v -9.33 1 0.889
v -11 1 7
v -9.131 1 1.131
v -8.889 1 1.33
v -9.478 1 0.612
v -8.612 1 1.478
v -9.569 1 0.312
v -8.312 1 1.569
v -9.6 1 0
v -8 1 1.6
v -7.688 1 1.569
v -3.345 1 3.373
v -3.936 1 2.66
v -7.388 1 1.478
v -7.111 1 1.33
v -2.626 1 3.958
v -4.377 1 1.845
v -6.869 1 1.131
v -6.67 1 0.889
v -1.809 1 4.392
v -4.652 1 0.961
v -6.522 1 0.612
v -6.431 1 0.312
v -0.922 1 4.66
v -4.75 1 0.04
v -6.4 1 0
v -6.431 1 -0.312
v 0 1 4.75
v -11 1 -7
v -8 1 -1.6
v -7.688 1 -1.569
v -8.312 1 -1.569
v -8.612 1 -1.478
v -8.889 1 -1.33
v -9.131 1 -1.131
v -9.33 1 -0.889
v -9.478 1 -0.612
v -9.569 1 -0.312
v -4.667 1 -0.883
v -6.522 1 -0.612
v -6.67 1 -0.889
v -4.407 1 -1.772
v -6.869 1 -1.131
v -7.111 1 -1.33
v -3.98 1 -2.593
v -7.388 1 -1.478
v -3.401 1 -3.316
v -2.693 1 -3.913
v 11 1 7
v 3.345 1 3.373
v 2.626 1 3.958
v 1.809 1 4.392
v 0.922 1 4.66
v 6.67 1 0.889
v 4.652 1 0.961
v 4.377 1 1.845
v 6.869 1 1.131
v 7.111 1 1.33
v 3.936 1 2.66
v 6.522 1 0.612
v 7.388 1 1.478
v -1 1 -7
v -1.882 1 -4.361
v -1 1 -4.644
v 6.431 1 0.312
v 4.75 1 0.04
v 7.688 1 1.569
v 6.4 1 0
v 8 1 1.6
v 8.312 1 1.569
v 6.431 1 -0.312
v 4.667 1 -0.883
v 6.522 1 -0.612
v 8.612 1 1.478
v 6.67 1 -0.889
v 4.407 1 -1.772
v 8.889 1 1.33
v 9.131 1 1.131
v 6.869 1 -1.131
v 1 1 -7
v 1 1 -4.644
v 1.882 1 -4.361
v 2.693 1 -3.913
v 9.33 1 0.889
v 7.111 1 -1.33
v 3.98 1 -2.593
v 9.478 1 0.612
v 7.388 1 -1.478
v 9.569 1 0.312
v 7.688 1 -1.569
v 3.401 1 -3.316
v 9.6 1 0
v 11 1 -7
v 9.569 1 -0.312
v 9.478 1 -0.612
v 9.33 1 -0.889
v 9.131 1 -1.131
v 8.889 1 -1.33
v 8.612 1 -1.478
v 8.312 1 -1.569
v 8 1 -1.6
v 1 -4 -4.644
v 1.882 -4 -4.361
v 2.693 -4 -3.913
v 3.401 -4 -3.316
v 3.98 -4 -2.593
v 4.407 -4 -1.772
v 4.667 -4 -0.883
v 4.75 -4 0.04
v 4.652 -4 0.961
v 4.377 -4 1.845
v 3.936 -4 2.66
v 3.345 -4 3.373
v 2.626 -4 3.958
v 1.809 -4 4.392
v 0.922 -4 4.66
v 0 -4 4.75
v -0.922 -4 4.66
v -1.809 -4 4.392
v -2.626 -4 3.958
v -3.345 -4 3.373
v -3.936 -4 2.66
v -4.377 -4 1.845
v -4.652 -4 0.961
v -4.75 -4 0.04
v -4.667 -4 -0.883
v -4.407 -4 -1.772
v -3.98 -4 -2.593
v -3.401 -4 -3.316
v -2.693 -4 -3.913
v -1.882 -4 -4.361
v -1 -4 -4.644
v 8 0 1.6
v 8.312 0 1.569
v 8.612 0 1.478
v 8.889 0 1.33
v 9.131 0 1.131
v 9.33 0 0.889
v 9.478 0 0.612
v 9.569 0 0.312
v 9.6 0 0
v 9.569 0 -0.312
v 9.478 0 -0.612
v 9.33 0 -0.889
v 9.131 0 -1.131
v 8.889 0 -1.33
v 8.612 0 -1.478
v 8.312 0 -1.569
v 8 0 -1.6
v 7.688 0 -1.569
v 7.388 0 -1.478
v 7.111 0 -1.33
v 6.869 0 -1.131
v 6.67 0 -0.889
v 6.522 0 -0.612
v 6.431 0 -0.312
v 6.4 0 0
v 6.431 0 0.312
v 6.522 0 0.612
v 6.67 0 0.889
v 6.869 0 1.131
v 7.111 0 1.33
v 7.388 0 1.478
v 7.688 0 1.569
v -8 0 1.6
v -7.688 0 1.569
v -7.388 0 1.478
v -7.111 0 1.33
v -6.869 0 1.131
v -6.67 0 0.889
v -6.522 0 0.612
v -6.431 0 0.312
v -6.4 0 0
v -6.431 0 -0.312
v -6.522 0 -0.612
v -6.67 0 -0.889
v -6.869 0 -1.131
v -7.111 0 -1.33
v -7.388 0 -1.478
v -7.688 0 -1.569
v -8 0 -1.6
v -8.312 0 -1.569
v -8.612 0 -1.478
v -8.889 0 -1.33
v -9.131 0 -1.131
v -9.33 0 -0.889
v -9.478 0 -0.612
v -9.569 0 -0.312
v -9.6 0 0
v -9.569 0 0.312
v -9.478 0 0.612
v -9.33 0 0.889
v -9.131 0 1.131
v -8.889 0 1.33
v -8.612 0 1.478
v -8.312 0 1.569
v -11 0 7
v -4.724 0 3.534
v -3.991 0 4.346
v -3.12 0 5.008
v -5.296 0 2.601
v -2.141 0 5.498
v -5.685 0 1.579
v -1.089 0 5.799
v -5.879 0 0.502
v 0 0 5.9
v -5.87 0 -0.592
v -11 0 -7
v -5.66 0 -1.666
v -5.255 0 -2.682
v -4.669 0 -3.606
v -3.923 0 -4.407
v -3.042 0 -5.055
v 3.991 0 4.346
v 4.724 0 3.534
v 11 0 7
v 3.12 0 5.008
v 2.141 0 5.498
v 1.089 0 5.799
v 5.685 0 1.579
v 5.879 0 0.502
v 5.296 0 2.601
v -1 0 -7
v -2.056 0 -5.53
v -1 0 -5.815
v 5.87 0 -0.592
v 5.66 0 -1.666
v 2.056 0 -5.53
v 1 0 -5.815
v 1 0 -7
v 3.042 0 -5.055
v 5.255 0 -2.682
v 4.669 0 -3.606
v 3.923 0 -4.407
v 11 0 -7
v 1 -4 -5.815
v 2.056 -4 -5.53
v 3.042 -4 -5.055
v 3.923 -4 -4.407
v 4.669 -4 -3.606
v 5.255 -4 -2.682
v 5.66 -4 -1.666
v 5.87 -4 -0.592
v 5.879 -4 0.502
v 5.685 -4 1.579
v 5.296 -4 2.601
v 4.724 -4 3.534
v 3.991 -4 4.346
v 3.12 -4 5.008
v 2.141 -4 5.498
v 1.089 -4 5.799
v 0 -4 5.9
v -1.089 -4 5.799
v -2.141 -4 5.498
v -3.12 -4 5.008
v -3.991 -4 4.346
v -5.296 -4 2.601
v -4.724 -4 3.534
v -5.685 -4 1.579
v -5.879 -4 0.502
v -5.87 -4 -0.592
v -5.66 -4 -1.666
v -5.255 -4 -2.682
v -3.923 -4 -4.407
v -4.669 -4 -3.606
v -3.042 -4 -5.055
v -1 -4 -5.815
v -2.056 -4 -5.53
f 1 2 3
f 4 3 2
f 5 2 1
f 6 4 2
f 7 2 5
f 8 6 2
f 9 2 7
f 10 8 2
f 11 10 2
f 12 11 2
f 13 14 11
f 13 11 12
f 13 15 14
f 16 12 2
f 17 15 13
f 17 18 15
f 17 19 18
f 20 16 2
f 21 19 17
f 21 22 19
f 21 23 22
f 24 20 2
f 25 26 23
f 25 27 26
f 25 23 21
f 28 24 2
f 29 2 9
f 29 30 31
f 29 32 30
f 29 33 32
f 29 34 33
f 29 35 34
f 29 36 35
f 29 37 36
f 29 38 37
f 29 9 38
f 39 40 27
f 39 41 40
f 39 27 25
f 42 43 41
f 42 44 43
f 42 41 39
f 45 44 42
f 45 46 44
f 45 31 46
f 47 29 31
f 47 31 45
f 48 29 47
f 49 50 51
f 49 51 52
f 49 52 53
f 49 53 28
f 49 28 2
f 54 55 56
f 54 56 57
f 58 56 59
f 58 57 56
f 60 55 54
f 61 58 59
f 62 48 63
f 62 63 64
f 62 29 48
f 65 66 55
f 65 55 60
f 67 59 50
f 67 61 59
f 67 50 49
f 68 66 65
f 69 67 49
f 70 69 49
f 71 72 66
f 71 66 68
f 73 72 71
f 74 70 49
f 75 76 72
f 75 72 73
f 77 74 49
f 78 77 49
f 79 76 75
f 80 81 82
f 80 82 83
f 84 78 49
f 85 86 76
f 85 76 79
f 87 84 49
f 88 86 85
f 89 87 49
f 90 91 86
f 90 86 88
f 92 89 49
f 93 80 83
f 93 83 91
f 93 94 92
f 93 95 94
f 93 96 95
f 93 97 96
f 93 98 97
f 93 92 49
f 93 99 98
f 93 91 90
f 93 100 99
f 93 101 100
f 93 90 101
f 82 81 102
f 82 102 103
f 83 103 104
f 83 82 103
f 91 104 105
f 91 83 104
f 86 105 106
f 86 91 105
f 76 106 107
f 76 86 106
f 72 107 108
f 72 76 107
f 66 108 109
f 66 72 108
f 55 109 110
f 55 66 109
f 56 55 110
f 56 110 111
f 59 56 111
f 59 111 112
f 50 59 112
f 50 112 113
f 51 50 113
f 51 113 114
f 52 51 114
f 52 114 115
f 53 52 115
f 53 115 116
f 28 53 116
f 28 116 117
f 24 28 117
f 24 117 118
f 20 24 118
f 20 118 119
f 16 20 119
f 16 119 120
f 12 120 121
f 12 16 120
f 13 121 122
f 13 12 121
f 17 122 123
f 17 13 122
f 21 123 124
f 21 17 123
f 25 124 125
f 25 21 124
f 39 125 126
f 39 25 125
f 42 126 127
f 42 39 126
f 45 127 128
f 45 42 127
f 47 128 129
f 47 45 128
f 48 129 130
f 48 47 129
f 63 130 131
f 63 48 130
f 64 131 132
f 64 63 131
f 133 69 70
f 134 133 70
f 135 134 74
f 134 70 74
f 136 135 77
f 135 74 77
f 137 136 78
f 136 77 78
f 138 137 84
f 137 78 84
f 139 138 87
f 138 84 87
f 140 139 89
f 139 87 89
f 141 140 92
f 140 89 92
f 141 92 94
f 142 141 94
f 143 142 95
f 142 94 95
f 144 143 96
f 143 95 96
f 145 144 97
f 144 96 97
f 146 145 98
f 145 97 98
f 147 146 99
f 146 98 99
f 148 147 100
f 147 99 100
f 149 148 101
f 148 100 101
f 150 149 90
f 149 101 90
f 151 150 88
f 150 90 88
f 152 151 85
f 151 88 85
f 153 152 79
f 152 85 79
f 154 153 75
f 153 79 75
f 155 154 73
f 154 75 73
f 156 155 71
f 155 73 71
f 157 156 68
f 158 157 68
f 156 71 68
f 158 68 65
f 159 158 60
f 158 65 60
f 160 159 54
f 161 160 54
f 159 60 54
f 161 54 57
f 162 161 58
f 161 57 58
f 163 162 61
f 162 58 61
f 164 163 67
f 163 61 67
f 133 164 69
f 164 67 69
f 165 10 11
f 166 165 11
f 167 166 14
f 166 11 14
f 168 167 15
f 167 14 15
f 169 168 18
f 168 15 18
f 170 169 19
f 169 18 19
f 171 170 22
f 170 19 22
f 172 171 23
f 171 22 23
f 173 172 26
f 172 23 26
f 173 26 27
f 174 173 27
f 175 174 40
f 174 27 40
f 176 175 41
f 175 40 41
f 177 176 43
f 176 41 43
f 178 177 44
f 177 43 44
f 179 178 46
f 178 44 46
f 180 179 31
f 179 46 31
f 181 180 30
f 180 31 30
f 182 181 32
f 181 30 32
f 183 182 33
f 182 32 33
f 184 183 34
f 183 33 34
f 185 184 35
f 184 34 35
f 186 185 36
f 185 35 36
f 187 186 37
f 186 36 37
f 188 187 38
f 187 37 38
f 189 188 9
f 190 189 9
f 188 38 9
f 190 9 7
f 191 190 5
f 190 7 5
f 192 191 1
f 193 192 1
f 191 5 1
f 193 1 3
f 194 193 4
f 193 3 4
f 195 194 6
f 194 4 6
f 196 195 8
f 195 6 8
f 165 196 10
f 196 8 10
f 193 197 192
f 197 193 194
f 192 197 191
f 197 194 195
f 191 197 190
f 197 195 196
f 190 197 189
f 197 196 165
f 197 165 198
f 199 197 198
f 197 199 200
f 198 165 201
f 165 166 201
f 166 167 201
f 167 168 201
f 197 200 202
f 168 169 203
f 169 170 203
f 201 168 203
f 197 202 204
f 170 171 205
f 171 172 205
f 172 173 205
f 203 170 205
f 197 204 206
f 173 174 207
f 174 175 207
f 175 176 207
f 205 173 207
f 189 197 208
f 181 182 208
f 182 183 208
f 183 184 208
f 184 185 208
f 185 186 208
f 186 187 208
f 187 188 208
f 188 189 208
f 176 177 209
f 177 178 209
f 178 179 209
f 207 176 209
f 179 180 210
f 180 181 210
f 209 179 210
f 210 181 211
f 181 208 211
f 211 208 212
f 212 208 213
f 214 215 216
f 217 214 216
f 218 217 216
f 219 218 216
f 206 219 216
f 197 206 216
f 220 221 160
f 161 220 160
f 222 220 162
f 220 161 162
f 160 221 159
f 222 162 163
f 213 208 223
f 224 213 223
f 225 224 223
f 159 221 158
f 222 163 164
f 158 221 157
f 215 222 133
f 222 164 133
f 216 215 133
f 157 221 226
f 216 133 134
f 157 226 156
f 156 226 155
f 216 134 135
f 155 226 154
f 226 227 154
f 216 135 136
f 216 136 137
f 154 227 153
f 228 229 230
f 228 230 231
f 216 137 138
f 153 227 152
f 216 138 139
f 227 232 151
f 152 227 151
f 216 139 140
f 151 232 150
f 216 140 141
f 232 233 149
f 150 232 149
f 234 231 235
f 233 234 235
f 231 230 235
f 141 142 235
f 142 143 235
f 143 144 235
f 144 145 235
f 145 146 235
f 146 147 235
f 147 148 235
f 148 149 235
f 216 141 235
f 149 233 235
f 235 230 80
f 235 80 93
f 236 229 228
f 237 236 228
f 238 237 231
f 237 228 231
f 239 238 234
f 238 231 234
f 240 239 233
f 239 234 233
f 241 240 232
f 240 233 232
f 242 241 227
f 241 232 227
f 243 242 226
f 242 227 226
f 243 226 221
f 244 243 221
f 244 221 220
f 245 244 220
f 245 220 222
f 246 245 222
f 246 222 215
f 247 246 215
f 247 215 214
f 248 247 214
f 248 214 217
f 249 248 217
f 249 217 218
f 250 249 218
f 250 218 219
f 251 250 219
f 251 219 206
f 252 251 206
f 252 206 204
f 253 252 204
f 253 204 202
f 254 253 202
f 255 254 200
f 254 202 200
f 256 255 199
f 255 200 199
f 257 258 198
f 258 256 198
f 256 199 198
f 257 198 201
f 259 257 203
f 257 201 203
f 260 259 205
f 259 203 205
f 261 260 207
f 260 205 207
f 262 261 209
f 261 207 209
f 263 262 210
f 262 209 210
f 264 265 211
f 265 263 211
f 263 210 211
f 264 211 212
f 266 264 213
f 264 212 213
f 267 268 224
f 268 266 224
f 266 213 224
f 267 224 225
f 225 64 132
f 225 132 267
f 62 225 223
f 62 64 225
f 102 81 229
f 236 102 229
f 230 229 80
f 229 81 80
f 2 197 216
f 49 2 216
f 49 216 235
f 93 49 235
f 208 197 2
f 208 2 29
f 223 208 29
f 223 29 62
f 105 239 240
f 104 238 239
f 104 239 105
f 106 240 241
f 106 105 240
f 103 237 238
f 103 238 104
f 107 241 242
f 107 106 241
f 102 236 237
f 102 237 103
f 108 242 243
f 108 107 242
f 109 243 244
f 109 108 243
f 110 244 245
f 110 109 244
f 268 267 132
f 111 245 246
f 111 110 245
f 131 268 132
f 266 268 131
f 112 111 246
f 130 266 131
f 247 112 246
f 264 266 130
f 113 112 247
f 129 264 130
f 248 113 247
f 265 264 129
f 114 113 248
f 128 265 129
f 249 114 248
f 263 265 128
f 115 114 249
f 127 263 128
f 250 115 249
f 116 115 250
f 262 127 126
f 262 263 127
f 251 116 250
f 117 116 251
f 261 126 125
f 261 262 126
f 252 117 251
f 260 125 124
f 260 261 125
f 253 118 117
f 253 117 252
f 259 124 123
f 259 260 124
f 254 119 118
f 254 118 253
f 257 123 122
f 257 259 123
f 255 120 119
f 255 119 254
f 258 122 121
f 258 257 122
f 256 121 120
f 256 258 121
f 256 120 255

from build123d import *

# Parameters (mm, degrees)
SKETCH_1_W          = 22
SKETCH_1_H          = 14
EXTRUDE_1_DEPTH     = 1
SKETCH_2_R          = 4.75
CUT_EXTRUDE_1_DEPTH = 14.076696831
SKETCH_3_R          = 5.9
SKETCH_3_R_2        = 4.75
EXTRUDE_2_DEPTH     = 4
SKETCH_4_R          = 1.6
CUT_EXTRUDE_2_DEPTH = 1
SKETCH_5_W          = 2
SKETCH_5_H          = 7.900772946
CUT_EXTRUDE_3_DEPTH = 10


with BuildPart() as part:
    # 草图1 → 凸台-拉伸1 (new body)
    with BuildSketch(Plane(origin=(0, 0, 0), x_dir=(1, 0, 0), z_dir=(0, 1, 0))):
        Rectangle(SKETCH_1_W, SKETCH_1_H)
    extrude(amount=EXTRUDE_1_DEPTH)

    # 草图2 → 切除-拉伸1 (cut, through all)
    with BuildSketch(Plane(origin=(0, 1, 0), x_dir=(1, 0, 0), z_dir=(0, 1, 0))):
        with Locations(Location((0, 0, 0), (0, 0, 270))):
            Circle(SKETCH_2_R)
    extrude(amount=-CUT_EXTRUDE_1_DEPTH, mode=Mode.SUBTRACT)

    # 草图3 → 凸台-拉伸2 (add)
    with BuildSketch(Plane(origin=(0, 0, 0), x_dir=(-1, 0, 0), z_dir=(0, -1, 0))):
        with Locations(Location((0, 0, 0), (0, 0, 270))):
            Circle(SKETCH_3_R)
        with Locations(Location((0, 0, 0), (0, 0, 270))):
            Circle(SKETCH_3_R_2, mode=Mode.SUBTRACT)
    extrude(amount=EXTRUDE_2_DEPTH)

    # 草图4 → 切除-拉伸2 (cut)
    with BuildSketch(Plane(origin=(0, 1, 0), x_dir=(1, 0, 0), z_dir=(0, 1, 0))):
        with Locations(Location((8, 0, 0), (0, 0, 270))):
            Circle(SKETCH_4_R)
        with Locations(Location((-8, 0, 0), (0, 0, 270))):
            Circle(SKETCH_4_R)
    extrude(amount=-CUT_EXTRUDE_2_DEPTH, mode=Mode.SUBTRACT)

    # 草图5 → 切除-拉伸3 (cut)
    with BuildSketch(Plane(origin=(0, 1, 0), x_dir=(1, 0, 0), z_dir=(0, 1, 0))):
        with Locations((0, 3.95882741)):
            Rectangle(SKETCH_5_W, SKETCH_5_H)
    extrude(amount=-CUT_EXTRUDE_3_DEPTH, mode=Mode.SUBTRACT)


solid = part.part
